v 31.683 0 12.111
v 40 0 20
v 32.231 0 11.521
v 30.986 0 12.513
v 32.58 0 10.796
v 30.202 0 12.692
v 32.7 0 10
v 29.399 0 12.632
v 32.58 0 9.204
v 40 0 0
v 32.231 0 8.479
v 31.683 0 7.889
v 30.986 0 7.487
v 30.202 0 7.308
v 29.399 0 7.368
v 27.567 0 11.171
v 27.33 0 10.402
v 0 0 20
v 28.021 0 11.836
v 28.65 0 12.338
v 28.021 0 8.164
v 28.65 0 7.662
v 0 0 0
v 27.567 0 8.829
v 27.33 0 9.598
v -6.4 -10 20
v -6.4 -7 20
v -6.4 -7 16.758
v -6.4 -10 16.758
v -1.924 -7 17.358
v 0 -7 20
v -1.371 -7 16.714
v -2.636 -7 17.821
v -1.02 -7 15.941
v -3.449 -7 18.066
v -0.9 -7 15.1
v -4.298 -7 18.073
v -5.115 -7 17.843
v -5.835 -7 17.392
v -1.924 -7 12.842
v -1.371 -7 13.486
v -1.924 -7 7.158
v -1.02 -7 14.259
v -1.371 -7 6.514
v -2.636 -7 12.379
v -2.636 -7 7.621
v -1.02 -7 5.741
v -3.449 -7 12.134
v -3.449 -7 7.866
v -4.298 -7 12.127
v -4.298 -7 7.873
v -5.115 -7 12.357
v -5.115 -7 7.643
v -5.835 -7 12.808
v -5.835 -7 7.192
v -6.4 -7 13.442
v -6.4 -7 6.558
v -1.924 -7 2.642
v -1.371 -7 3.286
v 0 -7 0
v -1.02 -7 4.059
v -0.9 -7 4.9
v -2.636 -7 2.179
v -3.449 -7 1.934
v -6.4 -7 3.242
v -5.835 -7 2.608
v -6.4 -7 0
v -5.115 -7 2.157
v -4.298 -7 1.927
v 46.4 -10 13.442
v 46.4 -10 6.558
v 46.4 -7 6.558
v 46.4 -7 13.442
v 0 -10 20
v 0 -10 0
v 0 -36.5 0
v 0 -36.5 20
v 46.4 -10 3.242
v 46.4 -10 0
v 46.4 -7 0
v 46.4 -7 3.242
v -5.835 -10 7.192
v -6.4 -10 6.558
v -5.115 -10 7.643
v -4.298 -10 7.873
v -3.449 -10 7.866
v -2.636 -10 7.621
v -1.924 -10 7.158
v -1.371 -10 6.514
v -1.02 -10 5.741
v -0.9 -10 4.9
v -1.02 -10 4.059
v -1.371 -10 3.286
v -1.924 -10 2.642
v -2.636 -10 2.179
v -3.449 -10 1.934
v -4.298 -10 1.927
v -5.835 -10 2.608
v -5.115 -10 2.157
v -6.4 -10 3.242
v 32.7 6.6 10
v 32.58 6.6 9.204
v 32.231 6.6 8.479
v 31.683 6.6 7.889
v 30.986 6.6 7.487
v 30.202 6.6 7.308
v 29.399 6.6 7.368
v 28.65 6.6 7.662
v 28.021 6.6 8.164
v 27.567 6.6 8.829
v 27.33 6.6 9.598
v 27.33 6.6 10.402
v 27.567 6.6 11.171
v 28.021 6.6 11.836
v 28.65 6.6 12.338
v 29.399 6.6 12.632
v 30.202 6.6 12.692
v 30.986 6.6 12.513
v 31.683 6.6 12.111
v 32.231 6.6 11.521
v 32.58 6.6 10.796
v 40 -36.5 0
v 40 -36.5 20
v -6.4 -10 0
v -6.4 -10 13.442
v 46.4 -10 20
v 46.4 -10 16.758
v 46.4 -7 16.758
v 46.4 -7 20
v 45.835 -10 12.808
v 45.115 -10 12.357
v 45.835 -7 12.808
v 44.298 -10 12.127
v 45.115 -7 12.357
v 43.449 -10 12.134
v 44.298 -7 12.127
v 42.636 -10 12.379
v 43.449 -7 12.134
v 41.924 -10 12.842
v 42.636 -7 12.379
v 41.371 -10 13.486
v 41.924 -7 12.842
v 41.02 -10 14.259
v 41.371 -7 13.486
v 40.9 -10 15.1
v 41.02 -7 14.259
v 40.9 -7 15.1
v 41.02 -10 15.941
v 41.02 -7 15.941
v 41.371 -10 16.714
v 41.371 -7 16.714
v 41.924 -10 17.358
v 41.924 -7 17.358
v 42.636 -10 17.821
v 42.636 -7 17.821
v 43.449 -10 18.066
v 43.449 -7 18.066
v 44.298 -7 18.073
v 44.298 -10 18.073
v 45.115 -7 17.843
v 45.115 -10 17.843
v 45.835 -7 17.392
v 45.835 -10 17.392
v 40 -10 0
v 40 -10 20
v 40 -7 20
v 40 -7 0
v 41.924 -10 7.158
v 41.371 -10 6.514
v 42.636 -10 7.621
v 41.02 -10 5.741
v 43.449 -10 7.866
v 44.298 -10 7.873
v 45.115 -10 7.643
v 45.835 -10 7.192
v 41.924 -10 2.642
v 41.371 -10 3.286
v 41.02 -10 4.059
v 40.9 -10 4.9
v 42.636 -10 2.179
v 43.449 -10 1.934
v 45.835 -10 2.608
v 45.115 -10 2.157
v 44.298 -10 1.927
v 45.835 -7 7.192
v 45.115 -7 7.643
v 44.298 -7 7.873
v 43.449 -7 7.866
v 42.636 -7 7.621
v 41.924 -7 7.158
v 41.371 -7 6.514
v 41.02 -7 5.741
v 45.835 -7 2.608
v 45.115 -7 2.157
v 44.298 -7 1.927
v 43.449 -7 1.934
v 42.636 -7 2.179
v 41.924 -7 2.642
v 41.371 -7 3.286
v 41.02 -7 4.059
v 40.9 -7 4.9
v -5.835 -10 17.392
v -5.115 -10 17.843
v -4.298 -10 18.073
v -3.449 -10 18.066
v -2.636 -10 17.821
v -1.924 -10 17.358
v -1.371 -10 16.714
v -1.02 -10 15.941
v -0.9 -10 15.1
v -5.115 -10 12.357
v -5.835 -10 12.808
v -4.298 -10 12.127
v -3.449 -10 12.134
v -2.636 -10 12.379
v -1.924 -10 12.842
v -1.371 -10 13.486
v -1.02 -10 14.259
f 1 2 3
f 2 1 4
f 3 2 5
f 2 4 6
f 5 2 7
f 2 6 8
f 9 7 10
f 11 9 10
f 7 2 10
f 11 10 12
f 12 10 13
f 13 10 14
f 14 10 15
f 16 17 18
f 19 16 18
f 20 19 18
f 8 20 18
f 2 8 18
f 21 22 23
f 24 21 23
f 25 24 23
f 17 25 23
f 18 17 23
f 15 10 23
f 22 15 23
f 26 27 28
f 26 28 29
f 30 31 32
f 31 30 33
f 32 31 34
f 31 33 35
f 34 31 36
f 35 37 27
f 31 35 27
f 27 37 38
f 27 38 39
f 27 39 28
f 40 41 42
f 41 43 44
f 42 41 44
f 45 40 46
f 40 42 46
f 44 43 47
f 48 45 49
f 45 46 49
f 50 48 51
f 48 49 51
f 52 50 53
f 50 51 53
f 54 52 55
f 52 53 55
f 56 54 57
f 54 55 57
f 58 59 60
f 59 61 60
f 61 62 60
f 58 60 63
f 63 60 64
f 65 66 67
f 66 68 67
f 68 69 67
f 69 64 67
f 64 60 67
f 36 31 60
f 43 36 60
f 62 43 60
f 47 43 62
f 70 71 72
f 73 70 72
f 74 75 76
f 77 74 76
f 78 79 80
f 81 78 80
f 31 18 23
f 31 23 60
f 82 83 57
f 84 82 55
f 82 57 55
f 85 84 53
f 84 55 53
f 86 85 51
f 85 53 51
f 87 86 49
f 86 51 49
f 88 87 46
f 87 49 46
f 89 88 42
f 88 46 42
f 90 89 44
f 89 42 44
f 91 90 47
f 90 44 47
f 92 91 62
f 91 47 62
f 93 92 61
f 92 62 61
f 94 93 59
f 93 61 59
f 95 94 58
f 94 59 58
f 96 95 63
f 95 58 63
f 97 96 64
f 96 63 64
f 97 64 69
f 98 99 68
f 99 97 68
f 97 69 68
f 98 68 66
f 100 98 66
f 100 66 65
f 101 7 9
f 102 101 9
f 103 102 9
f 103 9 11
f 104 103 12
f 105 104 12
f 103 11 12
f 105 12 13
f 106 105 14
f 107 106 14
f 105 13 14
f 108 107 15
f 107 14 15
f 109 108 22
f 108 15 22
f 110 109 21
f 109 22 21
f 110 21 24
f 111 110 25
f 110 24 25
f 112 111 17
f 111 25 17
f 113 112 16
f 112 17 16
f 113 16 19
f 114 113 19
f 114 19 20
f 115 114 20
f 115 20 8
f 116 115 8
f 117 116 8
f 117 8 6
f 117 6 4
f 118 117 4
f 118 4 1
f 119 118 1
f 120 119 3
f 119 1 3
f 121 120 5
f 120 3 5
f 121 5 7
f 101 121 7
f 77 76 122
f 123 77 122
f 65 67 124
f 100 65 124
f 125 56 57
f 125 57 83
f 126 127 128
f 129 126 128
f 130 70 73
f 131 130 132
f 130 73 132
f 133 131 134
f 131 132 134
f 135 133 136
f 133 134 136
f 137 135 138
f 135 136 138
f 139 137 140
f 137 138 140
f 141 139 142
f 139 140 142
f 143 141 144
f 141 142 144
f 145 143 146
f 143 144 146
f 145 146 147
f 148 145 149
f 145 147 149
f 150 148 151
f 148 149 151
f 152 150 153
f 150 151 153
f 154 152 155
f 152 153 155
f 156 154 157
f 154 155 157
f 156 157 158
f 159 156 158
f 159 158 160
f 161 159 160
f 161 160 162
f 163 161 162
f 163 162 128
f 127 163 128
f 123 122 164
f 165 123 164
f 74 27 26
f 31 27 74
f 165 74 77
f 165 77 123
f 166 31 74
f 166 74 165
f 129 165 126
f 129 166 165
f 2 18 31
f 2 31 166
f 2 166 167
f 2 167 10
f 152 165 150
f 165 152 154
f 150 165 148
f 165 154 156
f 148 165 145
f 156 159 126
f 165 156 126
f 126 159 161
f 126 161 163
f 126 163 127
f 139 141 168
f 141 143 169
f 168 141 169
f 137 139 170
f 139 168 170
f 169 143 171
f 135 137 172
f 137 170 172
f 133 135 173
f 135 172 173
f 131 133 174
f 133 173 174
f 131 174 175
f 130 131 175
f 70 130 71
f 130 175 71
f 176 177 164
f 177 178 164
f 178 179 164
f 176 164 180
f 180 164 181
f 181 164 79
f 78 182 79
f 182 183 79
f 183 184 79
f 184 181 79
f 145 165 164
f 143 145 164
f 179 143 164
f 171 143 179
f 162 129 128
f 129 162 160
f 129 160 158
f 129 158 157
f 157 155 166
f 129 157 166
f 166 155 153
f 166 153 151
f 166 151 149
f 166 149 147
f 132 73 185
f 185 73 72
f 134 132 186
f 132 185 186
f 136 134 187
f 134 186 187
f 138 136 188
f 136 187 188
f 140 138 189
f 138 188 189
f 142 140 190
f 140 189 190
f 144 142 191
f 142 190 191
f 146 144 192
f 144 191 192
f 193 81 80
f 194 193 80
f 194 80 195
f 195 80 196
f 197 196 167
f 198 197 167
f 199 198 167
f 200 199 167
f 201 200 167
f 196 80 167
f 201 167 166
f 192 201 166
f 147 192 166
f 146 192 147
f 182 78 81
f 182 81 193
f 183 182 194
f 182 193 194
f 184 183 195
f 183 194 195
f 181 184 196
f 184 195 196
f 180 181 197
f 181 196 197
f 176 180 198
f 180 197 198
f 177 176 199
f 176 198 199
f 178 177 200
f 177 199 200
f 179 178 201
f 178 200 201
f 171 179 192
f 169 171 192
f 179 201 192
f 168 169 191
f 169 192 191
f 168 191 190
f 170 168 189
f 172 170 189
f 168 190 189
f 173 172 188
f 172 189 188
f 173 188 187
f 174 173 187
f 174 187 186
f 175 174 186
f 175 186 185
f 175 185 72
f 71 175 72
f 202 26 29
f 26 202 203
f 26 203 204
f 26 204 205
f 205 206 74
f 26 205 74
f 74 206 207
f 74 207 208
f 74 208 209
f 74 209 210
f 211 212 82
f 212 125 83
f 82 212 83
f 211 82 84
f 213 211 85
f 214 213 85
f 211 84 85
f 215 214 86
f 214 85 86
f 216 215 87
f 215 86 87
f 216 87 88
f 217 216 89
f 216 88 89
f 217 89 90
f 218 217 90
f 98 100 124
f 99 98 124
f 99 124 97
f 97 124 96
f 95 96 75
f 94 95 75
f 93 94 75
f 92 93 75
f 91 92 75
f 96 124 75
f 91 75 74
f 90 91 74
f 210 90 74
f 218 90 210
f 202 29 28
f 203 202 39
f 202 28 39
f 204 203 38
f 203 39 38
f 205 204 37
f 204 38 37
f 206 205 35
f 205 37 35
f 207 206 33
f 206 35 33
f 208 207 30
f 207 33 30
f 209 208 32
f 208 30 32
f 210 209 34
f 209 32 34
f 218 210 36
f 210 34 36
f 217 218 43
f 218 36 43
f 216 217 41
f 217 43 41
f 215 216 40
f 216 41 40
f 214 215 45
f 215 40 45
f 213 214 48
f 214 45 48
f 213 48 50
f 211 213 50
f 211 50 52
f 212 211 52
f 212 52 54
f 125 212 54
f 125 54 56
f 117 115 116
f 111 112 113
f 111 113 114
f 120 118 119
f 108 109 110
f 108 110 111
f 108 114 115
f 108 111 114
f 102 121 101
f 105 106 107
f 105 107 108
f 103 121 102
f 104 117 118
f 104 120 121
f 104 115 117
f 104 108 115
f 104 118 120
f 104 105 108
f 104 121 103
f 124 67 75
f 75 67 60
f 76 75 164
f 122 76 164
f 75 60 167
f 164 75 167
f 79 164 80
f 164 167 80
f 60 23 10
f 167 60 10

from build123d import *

# Parameters (mm, degrees)
EXTRUDE_1_DEPTH     = 20
SKETCH_2_R          = 3
CUT_EXTRUDE_1_DEPTH = 30.5
SKETCH_3_R          = 2.7
EXTRUDE_2_DEPTH     = 6.6


with BuildPart() as part:
    # 草圖1 → 填料-伸長1 (new body)
    with BuildSketch(Plane.XY):
        Polygon((0, -7), (-6.4, -7), (-6.4, -10), (0, -10), (0, -36.5), (40, -36.5), (40, -10), (46.4, -10), (46.4, -7), (40, -7), (40, 0), (0, 0), align=None)
    extrude(amount=EXTRUDE_1_DEPTH)

    # 草圖2 → 除料-伸長1 (cut, through all)
    with BuildSketch(Plane(origin=(0, -7, 0), x_dir=(1, 0, 0), z_dir=(0, 1, 0))):
        with Locations((-3.9, -4.9)):
            Circle(SKETCH_2_R)
        with Locations((-3.9, -15.1)):
            Circle(SKETCH_2_R)
        with Locations((43.9, -15.1)):
            Circle(SKETCH_2_R)
        with Locations((43.9, -4.9)):
            Circle(SKETCH_2_R)
    extrude(amount=-CUT_EXTRUDE_1_DEPTH, mode=Mode.SUBTRACT)

    # 草圖3 → 填料-伸長2 (add)
    with BuildSketch(Plane(origin=(0, 0, 0), x_dir=(1, 0, 0), z_dir=(0, 1, 0))):
        with Locations((30, -10)):
            Circle(SKETCH_3_R)
    extrude(amount=EXTRUDE_2_DEPTH)


solid = part.part
